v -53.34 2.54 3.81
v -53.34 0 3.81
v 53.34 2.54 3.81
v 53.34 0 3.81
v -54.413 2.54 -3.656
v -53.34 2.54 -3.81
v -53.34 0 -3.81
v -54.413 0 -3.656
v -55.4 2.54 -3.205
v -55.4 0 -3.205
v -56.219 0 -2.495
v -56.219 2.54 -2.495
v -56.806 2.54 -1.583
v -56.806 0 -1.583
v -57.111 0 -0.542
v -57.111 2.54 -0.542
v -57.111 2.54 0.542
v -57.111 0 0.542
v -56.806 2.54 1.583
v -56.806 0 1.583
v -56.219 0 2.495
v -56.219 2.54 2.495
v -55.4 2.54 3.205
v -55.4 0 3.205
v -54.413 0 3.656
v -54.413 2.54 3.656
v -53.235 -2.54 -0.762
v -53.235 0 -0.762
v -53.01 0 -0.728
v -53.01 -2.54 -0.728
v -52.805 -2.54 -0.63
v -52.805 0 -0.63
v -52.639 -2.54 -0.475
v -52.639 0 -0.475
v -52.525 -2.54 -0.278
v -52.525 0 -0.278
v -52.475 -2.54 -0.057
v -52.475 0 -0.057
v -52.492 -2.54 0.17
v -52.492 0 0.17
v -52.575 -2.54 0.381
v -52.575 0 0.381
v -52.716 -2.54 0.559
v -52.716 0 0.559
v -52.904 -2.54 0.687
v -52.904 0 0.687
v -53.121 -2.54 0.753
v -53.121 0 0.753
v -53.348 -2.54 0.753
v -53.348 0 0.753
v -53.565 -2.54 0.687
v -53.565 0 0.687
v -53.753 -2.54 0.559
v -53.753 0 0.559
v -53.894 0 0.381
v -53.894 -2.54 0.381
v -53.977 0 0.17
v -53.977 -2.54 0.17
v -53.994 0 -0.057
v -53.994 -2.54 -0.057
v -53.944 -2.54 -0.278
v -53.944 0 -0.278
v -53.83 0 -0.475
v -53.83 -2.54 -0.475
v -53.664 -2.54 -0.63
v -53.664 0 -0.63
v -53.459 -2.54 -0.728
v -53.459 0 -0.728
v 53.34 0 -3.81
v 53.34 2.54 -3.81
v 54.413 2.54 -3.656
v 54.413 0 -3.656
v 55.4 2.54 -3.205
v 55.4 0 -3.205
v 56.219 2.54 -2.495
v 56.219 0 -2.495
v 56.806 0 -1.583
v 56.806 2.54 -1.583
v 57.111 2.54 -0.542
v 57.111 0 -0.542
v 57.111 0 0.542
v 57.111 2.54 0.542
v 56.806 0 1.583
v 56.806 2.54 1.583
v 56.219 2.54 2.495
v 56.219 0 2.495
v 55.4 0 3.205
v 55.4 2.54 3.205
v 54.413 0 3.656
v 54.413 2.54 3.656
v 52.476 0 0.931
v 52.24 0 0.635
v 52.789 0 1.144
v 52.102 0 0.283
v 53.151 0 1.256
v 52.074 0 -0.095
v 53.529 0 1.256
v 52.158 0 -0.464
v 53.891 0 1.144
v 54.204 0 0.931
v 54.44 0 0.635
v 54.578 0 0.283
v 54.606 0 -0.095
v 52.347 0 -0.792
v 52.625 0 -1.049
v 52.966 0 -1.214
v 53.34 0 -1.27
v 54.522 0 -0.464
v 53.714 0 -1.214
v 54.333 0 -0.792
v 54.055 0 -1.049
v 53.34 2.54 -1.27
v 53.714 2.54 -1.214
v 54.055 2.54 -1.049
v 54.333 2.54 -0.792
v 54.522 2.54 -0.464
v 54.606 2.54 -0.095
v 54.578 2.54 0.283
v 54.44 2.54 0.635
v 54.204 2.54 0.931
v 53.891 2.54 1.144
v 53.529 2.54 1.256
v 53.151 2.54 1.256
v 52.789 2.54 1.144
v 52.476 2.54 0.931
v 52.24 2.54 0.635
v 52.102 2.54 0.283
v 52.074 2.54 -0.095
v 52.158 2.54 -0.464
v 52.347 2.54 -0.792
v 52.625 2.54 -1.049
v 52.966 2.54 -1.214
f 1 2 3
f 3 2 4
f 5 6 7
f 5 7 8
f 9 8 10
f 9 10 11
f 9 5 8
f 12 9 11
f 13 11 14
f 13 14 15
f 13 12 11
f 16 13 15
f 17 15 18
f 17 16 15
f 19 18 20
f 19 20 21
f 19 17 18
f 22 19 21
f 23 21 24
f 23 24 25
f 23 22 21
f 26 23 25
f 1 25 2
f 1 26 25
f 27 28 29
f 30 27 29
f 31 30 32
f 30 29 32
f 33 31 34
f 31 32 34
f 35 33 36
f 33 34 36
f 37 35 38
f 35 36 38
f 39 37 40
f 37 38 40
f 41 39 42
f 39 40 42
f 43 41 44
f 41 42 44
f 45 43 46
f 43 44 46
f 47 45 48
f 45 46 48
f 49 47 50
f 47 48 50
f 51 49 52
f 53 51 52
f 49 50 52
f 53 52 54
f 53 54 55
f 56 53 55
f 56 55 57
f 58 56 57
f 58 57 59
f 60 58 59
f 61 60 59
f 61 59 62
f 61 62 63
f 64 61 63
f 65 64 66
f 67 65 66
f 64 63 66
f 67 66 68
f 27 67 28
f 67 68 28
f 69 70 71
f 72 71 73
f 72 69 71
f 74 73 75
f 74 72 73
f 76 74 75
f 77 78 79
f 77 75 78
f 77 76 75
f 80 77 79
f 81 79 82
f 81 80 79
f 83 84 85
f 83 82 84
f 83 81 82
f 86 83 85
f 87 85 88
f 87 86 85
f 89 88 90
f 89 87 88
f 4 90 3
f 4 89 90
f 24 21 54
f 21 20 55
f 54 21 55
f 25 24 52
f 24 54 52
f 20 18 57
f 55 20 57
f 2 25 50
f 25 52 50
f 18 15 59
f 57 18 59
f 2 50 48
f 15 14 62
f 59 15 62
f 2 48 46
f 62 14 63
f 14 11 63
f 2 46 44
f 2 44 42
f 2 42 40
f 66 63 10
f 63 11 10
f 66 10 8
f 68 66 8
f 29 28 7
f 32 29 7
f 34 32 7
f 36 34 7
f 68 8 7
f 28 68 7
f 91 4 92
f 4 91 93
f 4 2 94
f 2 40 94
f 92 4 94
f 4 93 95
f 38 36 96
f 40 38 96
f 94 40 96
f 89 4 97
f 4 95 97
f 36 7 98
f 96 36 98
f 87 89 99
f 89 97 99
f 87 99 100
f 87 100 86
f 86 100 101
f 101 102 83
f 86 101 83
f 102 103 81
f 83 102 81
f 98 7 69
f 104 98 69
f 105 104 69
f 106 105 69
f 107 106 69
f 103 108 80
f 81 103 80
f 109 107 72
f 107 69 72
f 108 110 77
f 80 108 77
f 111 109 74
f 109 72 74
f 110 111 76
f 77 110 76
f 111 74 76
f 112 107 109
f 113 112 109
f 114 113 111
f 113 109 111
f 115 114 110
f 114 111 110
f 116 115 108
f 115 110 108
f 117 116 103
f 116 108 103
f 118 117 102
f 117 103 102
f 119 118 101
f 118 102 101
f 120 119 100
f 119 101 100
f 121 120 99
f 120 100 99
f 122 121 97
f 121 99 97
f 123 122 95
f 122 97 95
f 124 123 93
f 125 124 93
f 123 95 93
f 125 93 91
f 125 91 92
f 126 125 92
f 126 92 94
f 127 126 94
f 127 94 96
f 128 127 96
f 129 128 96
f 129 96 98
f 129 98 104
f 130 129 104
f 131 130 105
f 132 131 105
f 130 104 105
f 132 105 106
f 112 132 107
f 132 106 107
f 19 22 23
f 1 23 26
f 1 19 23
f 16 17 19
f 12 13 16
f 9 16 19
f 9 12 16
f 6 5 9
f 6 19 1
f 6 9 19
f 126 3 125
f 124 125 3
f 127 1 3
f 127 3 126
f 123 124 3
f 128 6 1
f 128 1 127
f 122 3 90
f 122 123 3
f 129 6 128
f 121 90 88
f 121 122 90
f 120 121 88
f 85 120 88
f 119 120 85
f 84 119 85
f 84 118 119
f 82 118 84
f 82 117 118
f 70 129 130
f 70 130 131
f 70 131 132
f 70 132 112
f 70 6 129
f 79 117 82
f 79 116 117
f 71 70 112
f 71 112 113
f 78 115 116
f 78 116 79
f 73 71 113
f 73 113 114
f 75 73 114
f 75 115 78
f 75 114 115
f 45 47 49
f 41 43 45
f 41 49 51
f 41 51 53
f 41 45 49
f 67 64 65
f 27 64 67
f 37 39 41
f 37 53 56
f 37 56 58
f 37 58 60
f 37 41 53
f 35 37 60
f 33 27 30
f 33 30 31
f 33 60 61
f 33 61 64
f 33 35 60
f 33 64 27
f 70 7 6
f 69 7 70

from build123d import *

# Parameters (mm, degrees)
SKETCH1_W           = 114.3
SKETCH1_H           = 7.62
BOSS_EXTRUDE1_DEPTH = 2.54
FILLET1_RADIUS      = 3.81
FILLET1_LENGTH      = 2.54
FILLET4_RADIUS      = 3.81
FILLET4_LENGTH      = 2.54
SKETCH4_R           = 1.27
CUT_EXTRUDE1_DEPTH  = 2.54
SKETCH6_R           = 0.762
BOSS_EXTRUDE3_DEPTH = 2.54


with BuildPart() as part:
    # Sketch1 → Boss-Extrude1 (new body)
    with BuildSketch(Plane(origin=(0, 0, 0), x_dir=(1, 0, 0), z_dir=(0, 1, 0))):
        Rectangle(SKETCH1_W, SKETCH1_H)
    extrude(amount=BOSS_EXTRUDE1_DEPTH)

    # Fillet1: full round fillet: the end face becomes a half cylinder, R = half its width
    fillet1_face = Plane((57.15, 1.27, 0), x_dir=(0, -1, 0), z_dir=(1, 0, 0))  # on the end face: x along it, z out of the body
    fillet1_slab = fillet1_face.offset(-FILLET1_RADIUS / 2) * Box(FILLET1_LENGTH, 2 * FILLET1_RADIUS, FILLET1_RADIUS, mode=Mode.PRIVATE)  # the body's end, R deep
    fillet1_round = Plane((53.34, 1.27, 0), x_dir=(1, 0, 0), z_dir=(0, -1, 0)) * Cylinder(FILLET1_RADIUS, FILLET1_LENGTH, mode=Mode.PRIVATE)  # its axis R under the face
    add(fillet1_slab - fillet1_round, mode=Mode.SUBTRACT)

    # Fillet4: full round fillet: the end face becomes a half cylinder, R = half its width
    fillet4_face = Plane((-57.15, 1.27, 0), x_dir=(0, 1, 0), z_dir=(-1, 0, 0))  # on the end face: x along it, z out of the body
    fillet4_slab = fillet4_face.offset(-FILLET4_RADIUS / 2) * Box(FILLET4_LENGTH, 2 * FILLET4_RADIUS, FILLET4_RADIUS, mode=Mode.PRIVATE)  # the body's end, R deep
    fillet4_round = Plane((-53.34, 1.27, 0), x_dir=(-1, 0, 0), z_dir=(0, 1, 0)) * Cylinder(FILLET4_RADIUS, FILLET4_LENGTH, mode=Mode.PRIVATE)  # its axis R under the face
    add(fillet4_slab - fillet4_round, mode=Mode.SUBTRACT)

    # Sketch4 → Cut-Extrude1 (cut)
    with BuildSketch(Plane(origin=(0, 0, 0), x_dir=(-1, 0, 0), z_dir=(0, -1, 0))):
        with Locations(Location((-53.34, 0, 0), (0, 0, 90))):
            Circle(SKETCH4_R)
    extrude(amount=-CUT_EXTRUDE1_DEPTH, mode=Mode.SUBTRACT)

    # Sketch6 → Boss-Extrude3 (add)
    with BuildSketch(Plane(origin=(0, 0, 0), x_dir=(-1, 0, 0), z_dir=(0, -1, 0))):
        with Locations(Location((53.234546108, 0, 0), (0, 0, 90))):
            Circle(SKETCH6_R)
    extrude(amount=BOSS_EXTRUDE3_DEPTH)


solid = part.part
